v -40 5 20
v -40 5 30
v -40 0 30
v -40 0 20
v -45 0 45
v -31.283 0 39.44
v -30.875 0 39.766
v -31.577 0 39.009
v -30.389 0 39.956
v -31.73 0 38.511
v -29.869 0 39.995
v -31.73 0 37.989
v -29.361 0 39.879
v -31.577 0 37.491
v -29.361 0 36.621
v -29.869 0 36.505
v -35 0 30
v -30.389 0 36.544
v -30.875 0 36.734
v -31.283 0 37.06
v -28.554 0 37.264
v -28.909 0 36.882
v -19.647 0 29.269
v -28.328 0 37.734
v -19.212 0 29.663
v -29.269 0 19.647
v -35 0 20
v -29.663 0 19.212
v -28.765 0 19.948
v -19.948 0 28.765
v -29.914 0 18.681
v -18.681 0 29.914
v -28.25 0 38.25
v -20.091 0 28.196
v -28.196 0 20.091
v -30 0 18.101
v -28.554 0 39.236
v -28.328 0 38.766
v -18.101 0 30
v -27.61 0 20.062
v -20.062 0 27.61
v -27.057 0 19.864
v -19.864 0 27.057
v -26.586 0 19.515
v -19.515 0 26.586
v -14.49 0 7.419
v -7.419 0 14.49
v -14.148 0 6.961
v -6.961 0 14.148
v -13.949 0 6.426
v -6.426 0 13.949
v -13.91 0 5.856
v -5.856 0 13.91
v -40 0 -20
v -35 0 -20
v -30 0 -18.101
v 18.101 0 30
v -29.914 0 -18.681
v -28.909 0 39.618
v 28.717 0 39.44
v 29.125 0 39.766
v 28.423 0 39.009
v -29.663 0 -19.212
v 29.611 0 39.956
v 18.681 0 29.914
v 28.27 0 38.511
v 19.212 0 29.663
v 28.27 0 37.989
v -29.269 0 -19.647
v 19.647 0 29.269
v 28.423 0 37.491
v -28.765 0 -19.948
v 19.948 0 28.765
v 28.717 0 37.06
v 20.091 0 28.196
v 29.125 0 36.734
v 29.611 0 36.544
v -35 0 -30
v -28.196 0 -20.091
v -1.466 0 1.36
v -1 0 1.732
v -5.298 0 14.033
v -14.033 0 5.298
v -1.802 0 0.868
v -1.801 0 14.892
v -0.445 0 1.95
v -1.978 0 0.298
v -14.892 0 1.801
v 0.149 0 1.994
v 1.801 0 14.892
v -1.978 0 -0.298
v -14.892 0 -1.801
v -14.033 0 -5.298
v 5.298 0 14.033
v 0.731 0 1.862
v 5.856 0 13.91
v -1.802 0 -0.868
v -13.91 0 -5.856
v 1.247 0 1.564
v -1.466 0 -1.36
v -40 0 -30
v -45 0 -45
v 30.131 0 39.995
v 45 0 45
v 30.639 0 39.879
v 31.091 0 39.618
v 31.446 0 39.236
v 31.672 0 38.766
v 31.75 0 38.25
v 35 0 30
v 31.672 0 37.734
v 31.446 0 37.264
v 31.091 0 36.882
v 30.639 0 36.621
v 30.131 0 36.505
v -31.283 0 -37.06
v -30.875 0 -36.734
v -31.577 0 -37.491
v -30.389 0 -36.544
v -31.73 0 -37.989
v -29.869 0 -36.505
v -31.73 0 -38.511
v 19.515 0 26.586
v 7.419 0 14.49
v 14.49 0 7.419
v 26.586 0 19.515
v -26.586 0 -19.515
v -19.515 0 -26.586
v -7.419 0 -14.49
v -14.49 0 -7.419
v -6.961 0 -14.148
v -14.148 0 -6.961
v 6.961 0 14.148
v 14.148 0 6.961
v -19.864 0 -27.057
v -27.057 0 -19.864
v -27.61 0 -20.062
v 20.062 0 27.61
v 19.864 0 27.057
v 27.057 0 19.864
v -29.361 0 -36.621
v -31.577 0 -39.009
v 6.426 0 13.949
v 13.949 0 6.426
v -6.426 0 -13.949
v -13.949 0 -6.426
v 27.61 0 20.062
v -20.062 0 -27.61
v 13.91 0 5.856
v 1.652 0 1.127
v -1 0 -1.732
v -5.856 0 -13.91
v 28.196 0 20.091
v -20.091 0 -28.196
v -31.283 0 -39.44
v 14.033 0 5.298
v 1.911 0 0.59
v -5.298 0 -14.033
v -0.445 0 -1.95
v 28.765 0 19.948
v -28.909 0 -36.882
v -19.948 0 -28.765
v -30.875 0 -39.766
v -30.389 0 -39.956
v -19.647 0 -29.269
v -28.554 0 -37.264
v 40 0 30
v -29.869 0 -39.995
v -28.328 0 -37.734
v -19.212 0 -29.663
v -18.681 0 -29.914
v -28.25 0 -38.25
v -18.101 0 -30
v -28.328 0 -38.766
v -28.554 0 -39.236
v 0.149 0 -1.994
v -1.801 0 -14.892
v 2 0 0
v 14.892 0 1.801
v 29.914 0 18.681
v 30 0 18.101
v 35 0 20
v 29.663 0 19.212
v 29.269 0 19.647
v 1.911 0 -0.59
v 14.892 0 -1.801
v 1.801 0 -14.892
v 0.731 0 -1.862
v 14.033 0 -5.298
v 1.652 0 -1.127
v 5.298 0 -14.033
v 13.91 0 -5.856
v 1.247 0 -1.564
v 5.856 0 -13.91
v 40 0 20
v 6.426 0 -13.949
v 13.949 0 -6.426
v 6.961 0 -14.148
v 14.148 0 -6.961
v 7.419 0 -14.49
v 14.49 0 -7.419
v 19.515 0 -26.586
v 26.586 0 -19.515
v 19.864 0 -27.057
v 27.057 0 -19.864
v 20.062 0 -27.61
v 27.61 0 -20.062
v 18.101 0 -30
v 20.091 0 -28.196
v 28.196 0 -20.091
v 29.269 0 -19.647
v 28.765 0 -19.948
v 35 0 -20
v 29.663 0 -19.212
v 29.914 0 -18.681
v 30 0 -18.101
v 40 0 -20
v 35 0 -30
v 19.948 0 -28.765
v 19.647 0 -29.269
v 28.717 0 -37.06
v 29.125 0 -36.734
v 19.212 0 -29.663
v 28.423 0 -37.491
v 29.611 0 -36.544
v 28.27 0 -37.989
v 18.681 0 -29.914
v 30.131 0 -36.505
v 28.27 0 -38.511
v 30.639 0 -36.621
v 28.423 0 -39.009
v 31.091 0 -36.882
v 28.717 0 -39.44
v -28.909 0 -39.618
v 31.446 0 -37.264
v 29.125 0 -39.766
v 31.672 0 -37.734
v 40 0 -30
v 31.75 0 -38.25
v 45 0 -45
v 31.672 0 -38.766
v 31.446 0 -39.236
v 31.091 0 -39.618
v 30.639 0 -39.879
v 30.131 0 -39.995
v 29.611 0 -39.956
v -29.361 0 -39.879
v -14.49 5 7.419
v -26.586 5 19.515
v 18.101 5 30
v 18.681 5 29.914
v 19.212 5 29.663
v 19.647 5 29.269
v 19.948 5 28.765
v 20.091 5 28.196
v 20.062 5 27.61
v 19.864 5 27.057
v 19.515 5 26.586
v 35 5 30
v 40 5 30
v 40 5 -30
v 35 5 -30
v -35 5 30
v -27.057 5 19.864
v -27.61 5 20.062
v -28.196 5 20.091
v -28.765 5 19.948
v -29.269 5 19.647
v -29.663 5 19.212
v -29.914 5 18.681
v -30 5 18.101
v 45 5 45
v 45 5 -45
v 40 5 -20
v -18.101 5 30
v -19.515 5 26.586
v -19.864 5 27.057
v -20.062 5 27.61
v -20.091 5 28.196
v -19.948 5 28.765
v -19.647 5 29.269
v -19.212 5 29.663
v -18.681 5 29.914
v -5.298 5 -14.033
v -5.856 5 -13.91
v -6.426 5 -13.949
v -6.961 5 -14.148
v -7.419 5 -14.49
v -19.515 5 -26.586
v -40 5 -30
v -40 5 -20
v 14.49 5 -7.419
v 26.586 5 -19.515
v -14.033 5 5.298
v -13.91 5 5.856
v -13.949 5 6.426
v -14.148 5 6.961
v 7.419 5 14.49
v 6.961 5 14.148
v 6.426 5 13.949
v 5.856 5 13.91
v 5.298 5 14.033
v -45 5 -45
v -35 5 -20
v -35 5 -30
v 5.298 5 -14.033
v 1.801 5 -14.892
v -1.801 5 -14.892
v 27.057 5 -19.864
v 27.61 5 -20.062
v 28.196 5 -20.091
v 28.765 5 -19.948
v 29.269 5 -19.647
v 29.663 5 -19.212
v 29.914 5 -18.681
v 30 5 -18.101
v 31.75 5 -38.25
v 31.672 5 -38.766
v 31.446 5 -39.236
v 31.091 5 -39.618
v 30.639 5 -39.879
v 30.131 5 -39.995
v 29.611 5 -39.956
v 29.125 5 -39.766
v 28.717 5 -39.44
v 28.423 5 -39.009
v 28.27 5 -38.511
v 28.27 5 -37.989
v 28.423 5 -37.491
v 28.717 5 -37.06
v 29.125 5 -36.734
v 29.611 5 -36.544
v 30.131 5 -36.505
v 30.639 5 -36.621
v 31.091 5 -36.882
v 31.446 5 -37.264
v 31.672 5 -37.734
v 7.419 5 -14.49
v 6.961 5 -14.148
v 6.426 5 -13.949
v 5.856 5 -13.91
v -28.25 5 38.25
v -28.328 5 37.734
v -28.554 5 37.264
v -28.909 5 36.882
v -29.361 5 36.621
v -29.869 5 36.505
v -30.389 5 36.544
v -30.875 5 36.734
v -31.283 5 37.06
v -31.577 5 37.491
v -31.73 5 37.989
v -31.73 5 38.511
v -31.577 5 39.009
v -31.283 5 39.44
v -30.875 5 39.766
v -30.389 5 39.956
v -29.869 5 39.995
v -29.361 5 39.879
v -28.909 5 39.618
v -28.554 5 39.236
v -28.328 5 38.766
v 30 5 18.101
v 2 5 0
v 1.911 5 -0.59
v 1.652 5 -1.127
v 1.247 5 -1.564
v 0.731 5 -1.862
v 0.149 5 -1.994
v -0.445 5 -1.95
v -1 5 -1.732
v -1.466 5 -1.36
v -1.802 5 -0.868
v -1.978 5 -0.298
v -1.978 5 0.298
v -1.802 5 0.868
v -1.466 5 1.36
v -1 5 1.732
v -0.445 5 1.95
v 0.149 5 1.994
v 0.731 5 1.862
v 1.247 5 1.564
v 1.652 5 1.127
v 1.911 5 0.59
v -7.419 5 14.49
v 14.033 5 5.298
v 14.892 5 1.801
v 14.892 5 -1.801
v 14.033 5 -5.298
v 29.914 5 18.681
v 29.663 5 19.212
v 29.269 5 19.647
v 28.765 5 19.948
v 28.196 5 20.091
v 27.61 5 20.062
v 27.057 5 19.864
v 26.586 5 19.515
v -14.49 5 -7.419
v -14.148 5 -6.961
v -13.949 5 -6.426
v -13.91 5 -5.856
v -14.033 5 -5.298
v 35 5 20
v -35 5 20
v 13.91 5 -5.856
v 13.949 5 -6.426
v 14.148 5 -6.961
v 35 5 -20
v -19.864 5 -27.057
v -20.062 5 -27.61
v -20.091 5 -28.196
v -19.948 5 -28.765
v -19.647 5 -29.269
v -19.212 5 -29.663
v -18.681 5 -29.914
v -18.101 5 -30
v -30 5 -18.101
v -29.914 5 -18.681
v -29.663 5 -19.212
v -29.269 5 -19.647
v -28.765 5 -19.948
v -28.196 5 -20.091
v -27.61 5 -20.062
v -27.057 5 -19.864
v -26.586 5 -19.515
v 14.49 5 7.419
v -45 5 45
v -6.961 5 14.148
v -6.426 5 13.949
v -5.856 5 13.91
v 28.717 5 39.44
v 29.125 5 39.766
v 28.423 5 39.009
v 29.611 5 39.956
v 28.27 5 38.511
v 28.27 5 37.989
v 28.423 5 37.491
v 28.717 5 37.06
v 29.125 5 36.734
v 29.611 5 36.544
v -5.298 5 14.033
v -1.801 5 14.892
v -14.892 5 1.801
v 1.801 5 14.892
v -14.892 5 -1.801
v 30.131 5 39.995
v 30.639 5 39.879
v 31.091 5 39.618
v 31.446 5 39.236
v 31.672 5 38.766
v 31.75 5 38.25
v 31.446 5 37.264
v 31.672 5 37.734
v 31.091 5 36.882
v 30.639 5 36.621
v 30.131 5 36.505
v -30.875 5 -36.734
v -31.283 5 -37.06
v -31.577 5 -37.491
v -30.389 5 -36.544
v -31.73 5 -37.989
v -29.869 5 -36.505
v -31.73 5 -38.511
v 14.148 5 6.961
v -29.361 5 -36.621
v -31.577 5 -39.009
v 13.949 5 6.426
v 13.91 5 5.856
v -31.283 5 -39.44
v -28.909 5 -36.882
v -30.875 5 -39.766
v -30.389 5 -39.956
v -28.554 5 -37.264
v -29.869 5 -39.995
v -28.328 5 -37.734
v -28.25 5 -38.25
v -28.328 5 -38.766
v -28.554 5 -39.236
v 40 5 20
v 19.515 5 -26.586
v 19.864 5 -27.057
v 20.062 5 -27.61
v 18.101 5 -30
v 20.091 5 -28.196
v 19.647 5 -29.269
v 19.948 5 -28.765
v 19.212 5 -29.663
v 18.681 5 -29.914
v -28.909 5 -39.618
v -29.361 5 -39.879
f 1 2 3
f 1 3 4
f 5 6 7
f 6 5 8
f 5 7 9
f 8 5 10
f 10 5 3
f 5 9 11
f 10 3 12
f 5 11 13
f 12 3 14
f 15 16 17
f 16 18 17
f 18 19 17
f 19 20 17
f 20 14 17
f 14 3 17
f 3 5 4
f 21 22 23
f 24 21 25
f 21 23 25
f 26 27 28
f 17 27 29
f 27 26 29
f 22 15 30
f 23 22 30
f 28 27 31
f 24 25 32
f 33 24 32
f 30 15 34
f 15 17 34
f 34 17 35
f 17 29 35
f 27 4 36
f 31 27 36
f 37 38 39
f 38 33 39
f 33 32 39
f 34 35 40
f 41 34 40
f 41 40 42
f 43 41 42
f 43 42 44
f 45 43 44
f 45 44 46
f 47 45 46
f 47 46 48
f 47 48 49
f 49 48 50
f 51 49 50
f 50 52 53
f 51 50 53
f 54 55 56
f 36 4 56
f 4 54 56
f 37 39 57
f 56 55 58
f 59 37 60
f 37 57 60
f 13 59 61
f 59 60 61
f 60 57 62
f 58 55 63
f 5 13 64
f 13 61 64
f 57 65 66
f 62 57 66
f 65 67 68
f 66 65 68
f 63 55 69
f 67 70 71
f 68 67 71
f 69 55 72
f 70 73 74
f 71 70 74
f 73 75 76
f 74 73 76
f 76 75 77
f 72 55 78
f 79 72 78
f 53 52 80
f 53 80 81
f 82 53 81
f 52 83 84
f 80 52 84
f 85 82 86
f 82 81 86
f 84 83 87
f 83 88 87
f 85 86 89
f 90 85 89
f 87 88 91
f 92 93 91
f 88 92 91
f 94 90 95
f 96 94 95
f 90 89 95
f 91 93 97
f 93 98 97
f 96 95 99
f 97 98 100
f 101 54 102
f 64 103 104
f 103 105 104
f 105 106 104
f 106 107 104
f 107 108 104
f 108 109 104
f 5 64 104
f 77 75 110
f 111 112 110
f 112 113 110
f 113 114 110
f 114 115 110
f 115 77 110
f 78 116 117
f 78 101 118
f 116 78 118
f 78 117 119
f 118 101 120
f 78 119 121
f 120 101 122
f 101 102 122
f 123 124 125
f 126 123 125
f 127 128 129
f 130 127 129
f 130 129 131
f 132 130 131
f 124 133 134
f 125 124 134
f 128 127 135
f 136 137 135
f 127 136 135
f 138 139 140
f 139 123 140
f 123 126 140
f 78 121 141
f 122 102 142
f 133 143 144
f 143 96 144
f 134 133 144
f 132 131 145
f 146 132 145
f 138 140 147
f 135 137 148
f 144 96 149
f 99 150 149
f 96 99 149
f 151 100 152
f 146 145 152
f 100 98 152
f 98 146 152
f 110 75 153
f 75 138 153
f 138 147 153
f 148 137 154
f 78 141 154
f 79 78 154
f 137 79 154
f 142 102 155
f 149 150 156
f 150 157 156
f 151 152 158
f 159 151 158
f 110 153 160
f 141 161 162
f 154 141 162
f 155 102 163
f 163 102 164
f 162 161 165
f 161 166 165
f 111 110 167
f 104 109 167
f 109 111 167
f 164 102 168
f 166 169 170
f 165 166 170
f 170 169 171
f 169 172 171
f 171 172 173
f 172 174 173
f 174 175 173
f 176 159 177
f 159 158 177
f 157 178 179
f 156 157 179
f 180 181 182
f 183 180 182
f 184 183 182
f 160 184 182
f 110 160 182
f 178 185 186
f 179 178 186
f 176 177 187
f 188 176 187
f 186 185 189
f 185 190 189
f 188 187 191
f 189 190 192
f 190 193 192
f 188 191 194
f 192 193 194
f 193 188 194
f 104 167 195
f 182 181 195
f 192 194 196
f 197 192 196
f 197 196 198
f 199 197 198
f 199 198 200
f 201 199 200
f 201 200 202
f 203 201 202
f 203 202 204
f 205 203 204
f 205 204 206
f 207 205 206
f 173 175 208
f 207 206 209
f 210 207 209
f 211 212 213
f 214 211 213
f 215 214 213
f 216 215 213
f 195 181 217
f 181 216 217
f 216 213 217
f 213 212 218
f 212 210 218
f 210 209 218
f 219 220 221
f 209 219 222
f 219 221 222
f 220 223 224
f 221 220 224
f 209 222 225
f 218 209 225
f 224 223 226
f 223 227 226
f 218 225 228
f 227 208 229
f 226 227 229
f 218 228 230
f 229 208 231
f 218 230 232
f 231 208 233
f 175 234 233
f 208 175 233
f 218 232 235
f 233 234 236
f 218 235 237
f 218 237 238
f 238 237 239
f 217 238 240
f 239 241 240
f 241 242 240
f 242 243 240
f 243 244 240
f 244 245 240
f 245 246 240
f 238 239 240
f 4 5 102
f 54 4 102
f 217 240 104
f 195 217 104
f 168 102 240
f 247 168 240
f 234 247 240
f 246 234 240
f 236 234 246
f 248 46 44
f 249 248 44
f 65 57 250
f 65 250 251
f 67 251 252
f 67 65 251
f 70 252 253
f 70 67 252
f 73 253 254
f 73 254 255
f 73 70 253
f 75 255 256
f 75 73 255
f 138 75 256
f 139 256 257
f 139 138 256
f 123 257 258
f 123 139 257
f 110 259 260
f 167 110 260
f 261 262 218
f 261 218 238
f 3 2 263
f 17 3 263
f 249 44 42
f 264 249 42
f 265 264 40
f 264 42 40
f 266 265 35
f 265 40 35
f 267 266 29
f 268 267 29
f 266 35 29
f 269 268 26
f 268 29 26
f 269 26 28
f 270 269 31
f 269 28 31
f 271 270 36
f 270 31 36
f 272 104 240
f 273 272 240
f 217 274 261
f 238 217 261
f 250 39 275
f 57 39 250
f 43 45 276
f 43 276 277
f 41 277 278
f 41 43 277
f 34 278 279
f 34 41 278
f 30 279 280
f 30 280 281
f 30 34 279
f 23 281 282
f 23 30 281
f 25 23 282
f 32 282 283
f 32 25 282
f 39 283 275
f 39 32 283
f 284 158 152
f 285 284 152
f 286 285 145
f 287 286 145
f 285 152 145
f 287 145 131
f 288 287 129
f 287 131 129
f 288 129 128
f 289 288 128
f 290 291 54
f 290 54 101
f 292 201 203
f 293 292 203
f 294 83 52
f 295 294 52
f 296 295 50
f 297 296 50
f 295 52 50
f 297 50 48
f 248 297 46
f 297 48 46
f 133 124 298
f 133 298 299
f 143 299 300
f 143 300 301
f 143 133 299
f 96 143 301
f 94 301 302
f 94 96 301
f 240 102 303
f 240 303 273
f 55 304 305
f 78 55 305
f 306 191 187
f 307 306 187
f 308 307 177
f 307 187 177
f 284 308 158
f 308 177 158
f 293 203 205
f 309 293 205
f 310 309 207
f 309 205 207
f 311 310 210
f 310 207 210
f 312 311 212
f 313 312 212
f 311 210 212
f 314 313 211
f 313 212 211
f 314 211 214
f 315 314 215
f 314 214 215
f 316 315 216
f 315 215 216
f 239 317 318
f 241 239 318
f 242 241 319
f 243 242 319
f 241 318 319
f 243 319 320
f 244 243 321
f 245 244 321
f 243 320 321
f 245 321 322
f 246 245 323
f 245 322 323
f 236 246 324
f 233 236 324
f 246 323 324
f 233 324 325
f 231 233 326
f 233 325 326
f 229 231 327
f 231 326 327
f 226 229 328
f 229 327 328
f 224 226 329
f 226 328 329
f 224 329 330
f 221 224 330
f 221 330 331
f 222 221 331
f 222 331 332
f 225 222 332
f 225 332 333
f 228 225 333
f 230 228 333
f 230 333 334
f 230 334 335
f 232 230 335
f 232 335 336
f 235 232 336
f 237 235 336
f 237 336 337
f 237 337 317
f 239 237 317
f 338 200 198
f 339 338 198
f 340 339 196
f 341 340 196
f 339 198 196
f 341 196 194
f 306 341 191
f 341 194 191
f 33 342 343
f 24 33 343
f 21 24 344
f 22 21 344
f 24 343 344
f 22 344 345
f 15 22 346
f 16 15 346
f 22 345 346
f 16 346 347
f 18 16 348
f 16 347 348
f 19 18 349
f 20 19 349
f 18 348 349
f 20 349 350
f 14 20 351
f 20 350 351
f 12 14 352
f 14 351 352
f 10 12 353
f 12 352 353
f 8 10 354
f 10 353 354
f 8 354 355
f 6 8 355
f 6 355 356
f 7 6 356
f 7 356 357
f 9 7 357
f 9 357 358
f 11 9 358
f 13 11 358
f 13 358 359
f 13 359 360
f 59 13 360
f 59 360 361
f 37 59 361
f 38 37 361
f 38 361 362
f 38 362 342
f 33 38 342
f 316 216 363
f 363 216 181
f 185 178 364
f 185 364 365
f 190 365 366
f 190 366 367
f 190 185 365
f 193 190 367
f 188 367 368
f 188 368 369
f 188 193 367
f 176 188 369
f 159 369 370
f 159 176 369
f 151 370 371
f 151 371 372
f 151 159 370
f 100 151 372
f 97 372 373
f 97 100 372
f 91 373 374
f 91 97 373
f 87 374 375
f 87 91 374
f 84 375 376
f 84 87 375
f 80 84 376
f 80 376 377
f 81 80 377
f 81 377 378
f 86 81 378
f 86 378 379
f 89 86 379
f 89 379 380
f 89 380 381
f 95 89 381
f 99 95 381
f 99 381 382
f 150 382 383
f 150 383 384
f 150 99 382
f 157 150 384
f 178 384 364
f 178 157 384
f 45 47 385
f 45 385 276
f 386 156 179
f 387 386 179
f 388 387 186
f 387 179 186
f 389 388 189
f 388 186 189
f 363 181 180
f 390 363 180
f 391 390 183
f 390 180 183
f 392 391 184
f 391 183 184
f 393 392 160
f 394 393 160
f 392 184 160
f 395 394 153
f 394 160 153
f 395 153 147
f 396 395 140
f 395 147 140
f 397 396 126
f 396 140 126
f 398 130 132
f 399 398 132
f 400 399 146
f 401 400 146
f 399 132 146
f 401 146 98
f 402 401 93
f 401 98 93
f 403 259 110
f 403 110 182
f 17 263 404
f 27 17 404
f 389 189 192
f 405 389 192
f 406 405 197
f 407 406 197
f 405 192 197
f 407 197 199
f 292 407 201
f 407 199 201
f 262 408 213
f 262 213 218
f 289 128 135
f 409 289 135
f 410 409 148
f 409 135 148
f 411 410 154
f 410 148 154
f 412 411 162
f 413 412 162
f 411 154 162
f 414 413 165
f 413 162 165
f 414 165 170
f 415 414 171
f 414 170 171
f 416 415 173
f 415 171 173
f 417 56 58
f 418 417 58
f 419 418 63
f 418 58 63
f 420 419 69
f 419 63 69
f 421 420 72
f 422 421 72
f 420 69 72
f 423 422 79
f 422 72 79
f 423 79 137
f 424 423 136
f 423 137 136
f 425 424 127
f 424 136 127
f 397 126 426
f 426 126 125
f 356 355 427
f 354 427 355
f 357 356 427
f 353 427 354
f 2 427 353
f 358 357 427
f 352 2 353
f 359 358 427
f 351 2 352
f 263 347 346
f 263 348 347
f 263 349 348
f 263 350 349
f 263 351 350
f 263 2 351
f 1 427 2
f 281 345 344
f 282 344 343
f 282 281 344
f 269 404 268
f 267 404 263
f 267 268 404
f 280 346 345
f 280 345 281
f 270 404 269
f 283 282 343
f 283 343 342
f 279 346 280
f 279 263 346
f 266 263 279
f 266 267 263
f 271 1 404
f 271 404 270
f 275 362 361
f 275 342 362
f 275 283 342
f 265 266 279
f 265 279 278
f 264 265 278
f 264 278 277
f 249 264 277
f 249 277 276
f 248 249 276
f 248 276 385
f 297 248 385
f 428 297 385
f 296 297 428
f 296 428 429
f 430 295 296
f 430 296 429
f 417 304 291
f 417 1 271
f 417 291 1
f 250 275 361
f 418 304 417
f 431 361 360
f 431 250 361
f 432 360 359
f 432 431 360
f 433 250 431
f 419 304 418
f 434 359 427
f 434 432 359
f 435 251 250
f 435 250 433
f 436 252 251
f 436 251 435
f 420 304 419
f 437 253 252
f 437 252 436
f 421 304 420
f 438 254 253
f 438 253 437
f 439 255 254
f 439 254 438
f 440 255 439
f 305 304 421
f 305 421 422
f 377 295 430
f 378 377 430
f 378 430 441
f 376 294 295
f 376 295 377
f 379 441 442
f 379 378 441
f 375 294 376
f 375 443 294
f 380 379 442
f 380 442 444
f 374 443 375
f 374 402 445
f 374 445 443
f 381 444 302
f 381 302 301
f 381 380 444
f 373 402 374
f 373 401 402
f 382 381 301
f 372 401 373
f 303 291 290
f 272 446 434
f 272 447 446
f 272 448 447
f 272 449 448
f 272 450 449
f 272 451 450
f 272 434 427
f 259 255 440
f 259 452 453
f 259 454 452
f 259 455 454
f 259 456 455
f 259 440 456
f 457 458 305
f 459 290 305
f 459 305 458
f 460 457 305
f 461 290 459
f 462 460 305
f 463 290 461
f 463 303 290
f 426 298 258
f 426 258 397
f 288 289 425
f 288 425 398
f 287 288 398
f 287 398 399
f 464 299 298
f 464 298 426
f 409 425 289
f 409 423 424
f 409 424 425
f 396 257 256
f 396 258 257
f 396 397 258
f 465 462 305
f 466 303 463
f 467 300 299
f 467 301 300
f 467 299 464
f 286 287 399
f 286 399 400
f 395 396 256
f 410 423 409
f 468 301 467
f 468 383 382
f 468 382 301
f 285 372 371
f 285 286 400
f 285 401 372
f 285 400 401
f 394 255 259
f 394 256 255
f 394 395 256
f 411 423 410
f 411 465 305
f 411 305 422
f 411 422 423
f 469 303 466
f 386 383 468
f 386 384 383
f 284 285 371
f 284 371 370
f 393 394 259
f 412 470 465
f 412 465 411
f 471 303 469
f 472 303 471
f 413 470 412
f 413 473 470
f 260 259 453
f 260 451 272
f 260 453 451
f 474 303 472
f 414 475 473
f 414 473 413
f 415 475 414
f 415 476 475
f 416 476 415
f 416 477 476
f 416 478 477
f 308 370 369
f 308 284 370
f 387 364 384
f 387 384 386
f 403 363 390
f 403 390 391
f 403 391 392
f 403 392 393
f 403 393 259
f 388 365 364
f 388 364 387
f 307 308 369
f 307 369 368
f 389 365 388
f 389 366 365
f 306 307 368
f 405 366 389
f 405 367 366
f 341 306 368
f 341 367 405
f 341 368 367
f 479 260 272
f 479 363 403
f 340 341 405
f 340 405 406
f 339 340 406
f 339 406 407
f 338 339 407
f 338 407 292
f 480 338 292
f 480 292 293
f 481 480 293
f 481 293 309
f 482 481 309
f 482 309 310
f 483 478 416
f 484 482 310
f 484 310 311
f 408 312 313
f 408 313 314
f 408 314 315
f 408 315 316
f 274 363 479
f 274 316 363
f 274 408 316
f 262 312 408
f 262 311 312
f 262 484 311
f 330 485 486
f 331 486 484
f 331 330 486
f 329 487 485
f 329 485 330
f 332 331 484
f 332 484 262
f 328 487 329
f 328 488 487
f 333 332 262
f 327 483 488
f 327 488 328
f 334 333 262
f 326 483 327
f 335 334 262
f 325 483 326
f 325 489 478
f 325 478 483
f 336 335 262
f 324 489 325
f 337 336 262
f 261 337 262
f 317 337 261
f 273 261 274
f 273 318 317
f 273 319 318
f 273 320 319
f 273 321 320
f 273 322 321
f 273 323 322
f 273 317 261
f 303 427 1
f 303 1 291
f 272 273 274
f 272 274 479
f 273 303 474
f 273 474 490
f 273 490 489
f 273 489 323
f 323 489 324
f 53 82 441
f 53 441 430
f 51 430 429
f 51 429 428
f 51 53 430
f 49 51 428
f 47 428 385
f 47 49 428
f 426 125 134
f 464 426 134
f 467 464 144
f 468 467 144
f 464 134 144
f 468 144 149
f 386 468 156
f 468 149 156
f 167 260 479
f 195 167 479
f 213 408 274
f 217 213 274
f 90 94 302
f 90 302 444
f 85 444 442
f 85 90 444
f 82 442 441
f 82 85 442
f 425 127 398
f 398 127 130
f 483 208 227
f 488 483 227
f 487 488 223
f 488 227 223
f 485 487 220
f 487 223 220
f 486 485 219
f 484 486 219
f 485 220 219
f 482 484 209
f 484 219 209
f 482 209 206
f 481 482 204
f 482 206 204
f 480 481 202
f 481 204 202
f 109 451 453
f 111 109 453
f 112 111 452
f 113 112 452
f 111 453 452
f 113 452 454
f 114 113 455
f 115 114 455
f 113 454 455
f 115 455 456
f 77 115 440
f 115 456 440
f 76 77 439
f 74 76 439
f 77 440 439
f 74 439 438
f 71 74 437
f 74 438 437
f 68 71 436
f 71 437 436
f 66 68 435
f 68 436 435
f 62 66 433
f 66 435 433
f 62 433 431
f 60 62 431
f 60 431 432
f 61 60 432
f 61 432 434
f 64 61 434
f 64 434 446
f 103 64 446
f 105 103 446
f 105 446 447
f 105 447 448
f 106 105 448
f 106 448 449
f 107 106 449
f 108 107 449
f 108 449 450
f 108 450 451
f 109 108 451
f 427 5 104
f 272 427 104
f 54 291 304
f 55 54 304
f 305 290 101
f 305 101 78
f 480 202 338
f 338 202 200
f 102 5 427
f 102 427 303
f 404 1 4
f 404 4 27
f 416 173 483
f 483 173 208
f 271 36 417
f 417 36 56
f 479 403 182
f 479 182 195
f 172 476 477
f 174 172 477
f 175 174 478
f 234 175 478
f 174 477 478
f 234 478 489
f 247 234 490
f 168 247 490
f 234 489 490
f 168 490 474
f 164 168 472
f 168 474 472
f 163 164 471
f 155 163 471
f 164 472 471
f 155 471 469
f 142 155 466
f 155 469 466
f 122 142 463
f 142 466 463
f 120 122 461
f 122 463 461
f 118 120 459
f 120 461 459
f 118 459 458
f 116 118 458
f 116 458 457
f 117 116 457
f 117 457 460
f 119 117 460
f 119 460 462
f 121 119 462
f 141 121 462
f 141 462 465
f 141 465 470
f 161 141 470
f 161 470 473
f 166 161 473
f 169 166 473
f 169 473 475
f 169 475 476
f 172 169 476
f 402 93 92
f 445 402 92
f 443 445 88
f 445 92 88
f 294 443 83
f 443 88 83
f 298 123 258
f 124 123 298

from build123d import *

# Parameters (mm, degrees)
SKETCH1_W               = 90
SKETCH1_H               = 90
SKETCH1_R               = 2
BOSS_EXTRUDE1_DEPTH     = 5
SKETCH2_R               = 1.75
SKETCH2_W               = 5
SKETCH2_H               = 10
CUT_EXTRUDE1_DEPTH      = 1
CUT_EXTRUDE1_DEPTH_BACK = 6


with BuildPart() as part:
    # Sketch1 → Boss-Extrude1 (new body)
    with BuildSketch(Plane(origin=(0, 0, 0), x_dir=(1, 0, 0), z_dir=(0, 1, 0))):
        Rectangle(SKETCH1_W, SKETCH1_H)
        Circle(SKETCH1_R, mode=Mode.SUBTRACT)
        with BuildLine():
            Line((-26.585786438, 19.514718626), (-14.489985056, 7.418917244))
            ThreePointArc((-14.489985056, 7.418917244), (-13.949056578, 6.425915745), (-14.033116428, 5.298267955))
            ThreePointArc((-14.033116428, 5.298267955), (-15, 0), (-14.033116428, -5.298267955))
            ThreePointArc((-14.033116428, -5.298267955), (-13.949056578, -6.425915745), (-14.489985056, -7.418917244))
            Line((-14.489985056, -7.418917244), (-26.585786438, -19.514718626))
            ThreePointArc((-26.585786438, -19.514718626), (-28.765366865, -19.948264128), (-30, -18.100505063))
            Line((-30, -18.100505063), (-30, 18.100505063))
            ThreePointArc((-30, 18.100505063), (-28.765366865, 19.948264128), (-26.585786438, 19.514718626))
        make_face(mode=Mode.SUBTRACT)
        with BuildLine():
            Line((-18.100505063, 30), (18.100505063, 30))
            ThreePointArc((18.100505063, 30), (19.948264128, 28.765366865), (19.514718626, 26.585786438))
            Line((19.514718626, 26.585786438), (7.418917244, 14.489985056))
            ThreePointArc((7.418917244, 14.489985056), (6.425915745, 13.949056578), (5.298267955, 14.033116428))
            ThreePointArc((5.298267955, 14.033116428), (0, 15), (-5.298267955, 14.033116428))
            ThreePointArc((-5.298267955, 14.033116428), (-6.425915745, 13.949056578), (-7.418917244, 14.489985056))
            Line((-7.418917244, 14.489985056), (-19.514718626, 26.585786438))
            ThreePointArc((-19.514718626, 26.585786438), (-19.948264128, 28.765366865), (-18.100505063, 30))
        make_face(mode=Mode.SUBTRACT)
        with BuildLine():
            Line((30, 18.100505063), (30, -18.100505063))
            ThreePointArc((30, -18.100505063), (28.765366865, -19.948264128), (26.585786438, -19.514718626))
            Line((26.585786438, -19.514718626), (14.489985056, -7.418917244))
            ThreePointArc((14.489985056, -7.418917244), (13.949056578, -6.425915745), (14.033116428, -5.298267955))
            ThreePointArc((14.033116428, -5.298267955), (15, 0), (14.033116428, 5.298267955))
            ThreePointArc((14.033116428, 5.298267955), (13.949056578, 6.425915745), (14.489985056, 7.418917244))
            Line((14.489985056, 7.418917244), (26.585786438, 19.514718626))
            ThreePointArc((26.585786438, 19.514718626), (28.765366865, 19.948264128), (30, 18.100505063))
        make_face(mode=Mode.SUBTRACT)
        with BuildLine():
            Line((19.514718626, -26.585786438), (7.418917244, -14.489985056))
            ThreePointArc((7.418917244, -14.489985056), (6.425915745, -13.949056578), (5.298267955, -14.033116428))
            ThreePointArc((5.298267955, -14.033116428), (0, -15), (-5.298267955, -14.033116428))
            ThreePointArc((-5.298267955, -14.033116428), (-6.425915745, -13.949056578), (-7.418917244, -14.489985056))
            Line((-7.418917244, -14.489985056), (-19.514718626, -26.585786438))
            ThreePointArc((-19.514718626, -26.585786438), (-19.948264128, -28.765366865), (-18.100505063, -30))
            Line((-18.100505063, -30), (18.100505063, -30))
            ThreePointArc((18.100505063, -30), (19.948264128, -28.765366865), (19.514718626, -26.585786438))
        make_face(mode=Mode.SUBTRACT)
    extrude(amount=BOSS_EXTRUDE1_DEPTH)

    # Sketch2 → Cut-Extrude1 (cut, two sides)
    with BuildSketch(Plane(origin=(0, 5, 0), x_dir=(1, 0, 0), z_dir=(0, 1, 0))) as cut_extrude1_sk:
        with Locations((-30, -38.25)):
            Circle(SKETCH2_R)
        with Locations((30, -38.25)):
            Circle(SKETCH2_R)
        with Locations((30, 38.25)):
            Circle(SKETCH2_R)
        with Locations((-30, 38.25)):
            Circle(SKETCH2_R)
        with Locations((37.5, 25)):
            Rectangle(SKETCH2_W, SKETCH2_H)
        with Locations((37.5, -25)):
            Rectangle(SKETCH2_W, SKETCH2_H)
        with Locations((-37.5, -25)):
            Rectangle(SKETCH2_W, SKETCH2_H)
        with Locations((-37.5, 25)):
            Rectangle(SKETCH2_W, SKETCH2_H)
    extrude(amount=CUT_EXTRUDE1_DEPTH, mode=Mode.SUBTRACT)
    extrude(cut_extrude1_sk.sketch, amount=-CUT_EXTRUDE1_DEPTH_BACK, mode=Mode.SUBTRACT)


solid = part.part
